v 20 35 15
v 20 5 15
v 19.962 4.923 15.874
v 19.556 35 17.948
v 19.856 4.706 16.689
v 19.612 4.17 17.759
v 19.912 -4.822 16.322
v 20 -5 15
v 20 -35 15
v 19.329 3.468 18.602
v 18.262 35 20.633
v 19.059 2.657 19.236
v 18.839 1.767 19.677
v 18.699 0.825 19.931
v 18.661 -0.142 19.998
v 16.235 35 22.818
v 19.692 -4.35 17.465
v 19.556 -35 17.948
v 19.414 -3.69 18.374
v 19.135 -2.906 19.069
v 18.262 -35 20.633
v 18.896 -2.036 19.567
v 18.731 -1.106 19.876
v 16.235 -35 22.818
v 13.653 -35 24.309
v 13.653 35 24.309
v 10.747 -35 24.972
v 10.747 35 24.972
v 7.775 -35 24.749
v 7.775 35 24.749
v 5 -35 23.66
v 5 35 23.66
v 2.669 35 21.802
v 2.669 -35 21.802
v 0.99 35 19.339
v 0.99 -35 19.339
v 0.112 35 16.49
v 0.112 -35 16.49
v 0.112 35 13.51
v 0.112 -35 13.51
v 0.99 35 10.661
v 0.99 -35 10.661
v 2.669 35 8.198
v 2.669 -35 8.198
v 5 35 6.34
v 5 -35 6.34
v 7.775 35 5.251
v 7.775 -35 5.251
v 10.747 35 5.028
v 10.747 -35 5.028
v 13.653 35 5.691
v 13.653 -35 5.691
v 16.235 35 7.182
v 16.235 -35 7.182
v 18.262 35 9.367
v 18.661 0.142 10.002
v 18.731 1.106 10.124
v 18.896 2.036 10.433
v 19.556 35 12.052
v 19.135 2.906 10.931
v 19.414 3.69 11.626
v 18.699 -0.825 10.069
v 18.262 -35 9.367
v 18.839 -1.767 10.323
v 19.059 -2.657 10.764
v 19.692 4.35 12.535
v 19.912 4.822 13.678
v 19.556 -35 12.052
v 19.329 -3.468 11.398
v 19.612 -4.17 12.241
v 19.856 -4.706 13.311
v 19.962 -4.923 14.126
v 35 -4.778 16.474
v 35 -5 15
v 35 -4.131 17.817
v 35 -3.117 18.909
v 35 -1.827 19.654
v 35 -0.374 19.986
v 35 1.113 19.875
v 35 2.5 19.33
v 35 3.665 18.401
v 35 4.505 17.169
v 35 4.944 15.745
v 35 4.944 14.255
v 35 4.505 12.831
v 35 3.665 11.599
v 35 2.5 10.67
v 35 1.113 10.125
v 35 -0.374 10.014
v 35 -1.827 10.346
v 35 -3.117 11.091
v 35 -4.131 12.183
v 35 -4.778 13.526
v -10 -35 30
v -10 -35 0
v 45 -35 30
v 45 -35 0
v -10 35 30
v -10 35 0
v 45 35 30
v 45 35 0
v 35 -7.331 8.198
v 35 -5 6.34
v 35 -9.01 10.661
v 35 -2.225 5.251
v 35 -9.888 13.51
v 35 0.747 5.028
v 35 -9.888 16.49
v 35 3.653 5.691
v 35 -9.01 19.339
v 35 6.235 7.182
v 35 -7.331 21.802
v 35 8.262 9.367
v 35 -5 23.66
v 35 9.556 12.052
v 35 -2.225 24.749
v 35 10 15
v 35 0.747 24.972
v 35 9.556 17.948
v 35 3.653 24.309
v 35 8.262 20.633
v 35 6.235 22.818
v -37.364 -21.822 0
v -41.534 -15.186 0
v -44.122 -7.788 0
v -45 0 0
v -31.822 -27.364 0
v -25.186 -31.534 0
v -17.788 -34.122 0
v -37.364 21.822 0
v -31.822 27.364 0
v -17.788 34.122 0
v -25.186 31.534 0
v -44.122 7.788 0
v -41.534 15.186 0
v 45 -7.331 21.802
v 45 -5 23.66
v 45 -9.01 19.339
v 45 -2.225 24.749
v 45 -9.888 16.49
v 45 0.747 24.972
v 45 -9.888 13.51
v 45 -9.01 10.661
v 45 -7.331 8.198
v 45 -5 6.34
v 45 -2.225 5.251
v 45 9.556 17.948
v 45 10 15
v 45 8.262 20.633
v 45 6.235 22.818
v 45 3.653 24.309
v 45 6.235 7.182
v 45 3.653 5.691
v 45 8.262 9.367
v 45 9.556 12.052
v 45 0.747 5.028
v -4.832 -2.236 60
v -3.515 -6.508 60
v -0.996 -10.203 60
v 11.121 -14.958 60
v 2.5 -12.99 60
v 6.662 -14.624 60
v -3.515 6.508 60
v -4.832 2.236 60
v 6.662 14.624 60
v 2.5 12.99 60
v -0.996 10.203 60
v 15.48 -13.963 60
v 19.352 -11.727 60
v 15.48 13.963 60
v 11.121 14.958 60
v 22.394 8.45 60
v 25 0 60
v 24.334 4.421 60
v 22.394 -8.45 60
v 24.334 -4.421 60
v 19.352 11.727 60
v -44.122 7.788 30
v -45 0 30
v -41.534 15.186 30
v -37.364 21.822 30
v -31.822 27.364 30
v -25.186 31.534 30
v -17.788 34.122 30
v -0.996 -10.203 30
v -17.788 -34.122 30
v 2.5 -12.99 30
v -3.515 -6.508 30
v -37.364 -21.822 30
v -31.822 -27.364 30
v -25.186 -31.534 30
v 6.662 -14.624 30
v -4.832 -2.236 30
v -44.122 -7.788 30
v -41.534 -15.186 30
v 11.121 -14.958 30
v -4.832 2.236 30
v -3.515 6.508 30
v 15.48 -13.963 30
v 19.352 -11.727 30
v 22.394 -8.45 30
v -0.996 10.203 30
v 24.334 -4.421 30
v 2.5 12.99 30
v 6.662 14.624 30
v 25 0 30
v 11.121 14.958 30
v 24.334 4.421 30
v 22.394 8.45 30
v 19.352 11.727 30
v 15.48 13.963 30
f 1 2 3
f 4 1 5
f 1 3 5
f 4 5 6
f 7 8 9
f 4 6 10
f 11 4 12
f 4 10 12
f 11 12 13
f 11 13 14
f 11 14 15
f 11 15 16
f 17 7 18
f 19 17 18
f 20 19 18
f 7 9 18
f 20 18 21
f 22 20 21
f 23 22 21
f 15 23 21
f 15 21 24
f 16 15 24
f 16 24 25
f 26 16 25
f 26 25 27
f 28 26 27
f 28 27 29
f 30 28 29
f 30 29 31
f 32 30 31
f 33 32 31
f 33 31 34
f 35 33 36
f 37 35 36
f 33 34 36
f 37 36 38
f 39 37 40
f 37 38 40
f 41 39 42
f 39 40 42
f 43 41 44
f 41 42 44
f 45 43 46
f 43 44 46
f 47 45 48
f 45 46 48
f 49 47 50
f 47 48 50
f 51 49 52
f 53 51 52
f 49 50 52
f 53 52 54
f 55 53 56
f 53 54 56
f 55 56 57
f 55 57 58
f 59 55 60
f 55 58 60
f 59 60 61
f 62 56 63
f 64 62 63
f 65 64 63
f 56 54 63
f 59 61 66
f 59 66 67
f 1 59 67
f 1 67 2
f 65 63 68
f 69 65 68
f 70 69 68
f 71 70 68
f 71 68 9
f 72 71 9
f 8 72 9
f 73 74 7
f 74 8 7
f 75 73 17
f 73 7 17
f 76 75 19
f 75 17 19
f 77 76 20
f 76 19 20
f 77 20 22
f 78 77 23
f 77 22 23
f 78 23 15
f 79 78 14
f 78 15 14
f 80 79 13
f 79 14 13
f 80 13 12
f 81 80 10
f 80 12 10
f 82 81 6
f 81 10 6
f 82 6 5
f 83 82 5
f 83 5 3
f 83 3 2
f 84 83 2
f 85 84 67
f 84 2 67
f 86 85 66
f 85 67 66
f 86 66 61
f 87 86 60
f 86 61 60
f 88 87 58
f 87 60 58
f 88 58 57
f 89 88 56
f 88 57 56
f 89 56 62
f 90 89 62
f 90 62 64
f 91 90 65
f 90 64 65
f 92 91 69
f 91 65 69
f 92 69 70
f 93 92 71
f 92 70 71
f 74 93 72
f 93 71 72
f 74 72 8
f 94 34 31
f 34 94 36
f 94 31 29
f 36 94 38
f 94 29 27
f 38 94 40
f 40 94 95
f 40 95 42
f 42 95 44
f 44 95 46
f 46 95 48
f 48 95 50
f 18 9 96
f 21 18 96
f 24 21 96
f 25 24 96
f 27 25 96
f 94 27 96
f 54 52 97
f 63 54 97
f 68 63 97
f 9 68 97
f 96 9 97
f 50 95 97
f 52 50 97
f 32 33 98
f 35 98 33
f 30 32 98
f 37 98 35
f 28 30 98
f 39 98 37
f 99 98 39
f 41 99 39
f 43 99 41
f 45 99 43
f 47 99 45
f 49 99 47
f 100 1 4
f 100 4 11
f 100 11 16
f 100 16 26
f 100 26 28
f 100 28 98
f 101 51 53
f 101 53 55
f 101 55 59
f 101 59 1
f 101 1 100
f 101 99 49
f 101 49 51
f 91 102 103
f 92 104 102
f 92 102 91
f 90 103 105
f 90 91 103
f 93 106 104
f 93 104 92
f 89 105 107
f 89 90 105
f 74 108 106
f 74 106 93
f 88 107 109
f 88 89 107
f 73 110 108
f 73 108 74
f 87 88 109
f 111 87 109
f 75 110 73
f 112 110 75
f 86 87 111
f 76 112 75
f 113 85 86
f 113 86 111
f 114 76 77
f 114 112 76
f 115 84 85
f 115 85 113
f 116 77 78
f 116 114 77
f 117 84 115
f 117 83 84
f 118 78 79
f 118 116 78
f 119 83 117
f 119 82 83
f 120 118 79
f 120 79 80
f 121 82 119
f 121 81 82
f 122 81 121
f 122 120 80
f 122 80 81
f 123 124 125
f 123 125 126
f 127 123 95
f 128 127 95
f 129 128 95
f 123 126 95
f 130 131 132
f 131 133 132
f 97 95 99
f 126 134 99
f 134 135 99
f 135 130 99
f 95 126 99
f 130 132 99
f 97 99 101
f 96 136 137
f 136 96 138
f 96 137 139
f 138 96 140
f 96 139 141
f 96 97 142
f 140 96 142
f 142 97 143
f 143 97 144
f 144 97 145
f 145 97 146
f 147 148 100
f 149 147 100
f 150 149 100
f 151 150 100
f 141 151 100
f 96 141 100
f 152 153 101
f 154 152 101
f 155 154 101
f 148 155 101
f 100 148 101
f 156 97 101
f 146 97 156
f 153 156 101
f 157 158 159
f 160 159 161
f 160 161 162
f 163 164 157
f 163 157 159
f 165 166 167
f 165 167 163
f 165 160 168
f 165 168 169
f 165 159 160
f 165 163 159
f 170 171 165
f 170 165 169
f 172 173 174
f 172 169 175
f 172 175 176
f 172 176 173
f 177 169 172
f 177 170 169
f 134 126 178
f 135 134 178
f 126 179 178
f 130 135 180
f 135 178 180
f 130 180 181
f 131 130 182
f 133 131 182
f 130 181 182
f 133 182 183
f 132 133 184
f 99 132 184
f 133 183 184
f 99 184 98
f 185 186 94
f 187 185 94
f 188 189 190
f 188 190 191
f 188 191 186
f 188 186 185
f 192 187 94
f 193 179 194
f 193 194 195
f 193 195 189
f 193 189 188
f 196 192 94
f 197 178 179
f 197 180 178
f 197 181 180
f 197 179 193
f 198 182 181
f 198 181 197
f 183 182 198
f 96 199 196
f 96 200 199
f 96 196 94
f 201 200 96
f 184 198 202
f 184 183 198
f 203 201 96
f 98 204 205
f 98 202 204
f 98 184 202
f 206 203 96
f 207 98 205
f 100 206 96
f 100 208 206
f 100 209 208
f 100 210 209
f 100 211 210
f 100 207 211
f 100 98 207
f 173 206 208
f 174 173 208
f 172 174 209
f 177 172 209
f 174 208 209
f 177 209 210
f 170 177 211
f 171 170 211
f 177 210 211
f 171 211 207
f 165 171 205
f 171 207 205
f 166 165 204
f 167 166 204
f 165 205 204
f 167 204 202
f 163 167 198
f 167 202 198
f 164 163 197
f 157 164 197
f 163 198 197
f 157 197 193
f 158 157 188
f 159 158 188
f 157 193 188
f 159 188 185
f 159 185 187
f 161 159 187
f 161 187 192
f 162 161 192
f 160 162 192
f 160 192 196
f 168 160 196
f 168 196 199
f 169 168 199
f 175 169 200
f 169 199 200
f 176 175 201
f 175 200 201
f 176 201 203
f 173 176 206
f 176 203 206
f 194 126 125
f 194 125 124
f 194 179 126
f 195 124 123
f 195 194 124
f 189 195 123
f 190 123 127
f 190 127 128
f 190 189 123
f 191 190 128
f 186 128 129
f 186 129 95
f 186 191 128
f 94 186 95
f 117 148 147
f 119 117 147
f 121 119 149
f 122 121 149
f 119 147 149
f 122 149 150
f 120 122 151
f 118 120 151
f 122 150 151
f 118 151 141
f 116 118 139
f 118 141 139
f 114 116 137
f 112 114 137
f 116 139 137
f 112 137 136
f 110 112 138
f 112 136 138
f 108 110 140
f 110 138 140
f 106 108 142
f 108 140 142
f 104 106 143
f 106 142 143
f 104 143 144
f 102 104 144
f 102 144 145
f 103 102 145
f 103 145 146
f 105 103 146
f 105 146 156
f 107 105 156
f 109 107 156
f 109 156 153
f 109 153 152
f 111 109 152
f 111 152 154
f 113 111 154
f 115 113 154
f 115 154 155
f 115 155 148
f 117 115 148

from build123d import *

# Parameters (mm, degrees)
F0_W           = 90
F0_H           = 70
F1_DEPTH       = 30
F2_R           = 34.99999
F3_R           = 10
F4_DEPTH       = 70.001
F6_D           = 10
F6_DEPTH       = 35
F6_CBORE_D     = 20
F6_CBORE_DEPTH = 10
F6_TIP         = 3.0043030951
F7_R           = 15
F8_DEPTH       = 30


# Not quite as in the source:
# - a fillet or chamfer is up to 0.001 mm smaller than in the source, because OpenCascade refuses the exact size


with BuildPart() as f1:
    # F0 (on Top) → F1 (new body)
    with BuildSketch(Plane.XY):
        Rectangle(F0_W, F0_H)
    extrude(amount=F1_DEPTH)

    # F2 (radius 35 in the source; OpenCascade refuses exactly that, so slightly less here)
    f2_edges = [f1.edges().sort_by_distance(p)[0] for p in [
        (-45, 35, 15),
        (-45, -35, 15),
    ]]
    fillet(f2_edges, radius=F2_R)

    # F3 (on face) → F4 (cut, through all)
    with BuildSketch(Plane.XZ.offset(35)):
        with Locations((10, 15)):
            Circle(F3_R)
    extrude(amount=-F4_DEPTH, mode=Mode.SUBTRACT)

    # F6
    with Locations(Plane.YZ.offset(45)):
        with Locations((0, 15)):
            CounterBoreHole(F6_D / 2, F6_CBORE_D / 2, F6_CBORE_DEPTH, depth=F6_DEPTH)
            with Locations((0, 0, -(F6_DEPTH + F6_TIP / 2))):  # 118° drill point
                Cone(0, F6_D / 2, F6_TIP, mode=Mode.SUBTRACT)

    # F7 (on face) → F8 (join)
    with BuildSketch(Plane.XY.offset(30)):
        with Locations((10, 0)):
            Circle(F7_R)
    extrude(amount=F8_DEPTH)


solid = f1.part
